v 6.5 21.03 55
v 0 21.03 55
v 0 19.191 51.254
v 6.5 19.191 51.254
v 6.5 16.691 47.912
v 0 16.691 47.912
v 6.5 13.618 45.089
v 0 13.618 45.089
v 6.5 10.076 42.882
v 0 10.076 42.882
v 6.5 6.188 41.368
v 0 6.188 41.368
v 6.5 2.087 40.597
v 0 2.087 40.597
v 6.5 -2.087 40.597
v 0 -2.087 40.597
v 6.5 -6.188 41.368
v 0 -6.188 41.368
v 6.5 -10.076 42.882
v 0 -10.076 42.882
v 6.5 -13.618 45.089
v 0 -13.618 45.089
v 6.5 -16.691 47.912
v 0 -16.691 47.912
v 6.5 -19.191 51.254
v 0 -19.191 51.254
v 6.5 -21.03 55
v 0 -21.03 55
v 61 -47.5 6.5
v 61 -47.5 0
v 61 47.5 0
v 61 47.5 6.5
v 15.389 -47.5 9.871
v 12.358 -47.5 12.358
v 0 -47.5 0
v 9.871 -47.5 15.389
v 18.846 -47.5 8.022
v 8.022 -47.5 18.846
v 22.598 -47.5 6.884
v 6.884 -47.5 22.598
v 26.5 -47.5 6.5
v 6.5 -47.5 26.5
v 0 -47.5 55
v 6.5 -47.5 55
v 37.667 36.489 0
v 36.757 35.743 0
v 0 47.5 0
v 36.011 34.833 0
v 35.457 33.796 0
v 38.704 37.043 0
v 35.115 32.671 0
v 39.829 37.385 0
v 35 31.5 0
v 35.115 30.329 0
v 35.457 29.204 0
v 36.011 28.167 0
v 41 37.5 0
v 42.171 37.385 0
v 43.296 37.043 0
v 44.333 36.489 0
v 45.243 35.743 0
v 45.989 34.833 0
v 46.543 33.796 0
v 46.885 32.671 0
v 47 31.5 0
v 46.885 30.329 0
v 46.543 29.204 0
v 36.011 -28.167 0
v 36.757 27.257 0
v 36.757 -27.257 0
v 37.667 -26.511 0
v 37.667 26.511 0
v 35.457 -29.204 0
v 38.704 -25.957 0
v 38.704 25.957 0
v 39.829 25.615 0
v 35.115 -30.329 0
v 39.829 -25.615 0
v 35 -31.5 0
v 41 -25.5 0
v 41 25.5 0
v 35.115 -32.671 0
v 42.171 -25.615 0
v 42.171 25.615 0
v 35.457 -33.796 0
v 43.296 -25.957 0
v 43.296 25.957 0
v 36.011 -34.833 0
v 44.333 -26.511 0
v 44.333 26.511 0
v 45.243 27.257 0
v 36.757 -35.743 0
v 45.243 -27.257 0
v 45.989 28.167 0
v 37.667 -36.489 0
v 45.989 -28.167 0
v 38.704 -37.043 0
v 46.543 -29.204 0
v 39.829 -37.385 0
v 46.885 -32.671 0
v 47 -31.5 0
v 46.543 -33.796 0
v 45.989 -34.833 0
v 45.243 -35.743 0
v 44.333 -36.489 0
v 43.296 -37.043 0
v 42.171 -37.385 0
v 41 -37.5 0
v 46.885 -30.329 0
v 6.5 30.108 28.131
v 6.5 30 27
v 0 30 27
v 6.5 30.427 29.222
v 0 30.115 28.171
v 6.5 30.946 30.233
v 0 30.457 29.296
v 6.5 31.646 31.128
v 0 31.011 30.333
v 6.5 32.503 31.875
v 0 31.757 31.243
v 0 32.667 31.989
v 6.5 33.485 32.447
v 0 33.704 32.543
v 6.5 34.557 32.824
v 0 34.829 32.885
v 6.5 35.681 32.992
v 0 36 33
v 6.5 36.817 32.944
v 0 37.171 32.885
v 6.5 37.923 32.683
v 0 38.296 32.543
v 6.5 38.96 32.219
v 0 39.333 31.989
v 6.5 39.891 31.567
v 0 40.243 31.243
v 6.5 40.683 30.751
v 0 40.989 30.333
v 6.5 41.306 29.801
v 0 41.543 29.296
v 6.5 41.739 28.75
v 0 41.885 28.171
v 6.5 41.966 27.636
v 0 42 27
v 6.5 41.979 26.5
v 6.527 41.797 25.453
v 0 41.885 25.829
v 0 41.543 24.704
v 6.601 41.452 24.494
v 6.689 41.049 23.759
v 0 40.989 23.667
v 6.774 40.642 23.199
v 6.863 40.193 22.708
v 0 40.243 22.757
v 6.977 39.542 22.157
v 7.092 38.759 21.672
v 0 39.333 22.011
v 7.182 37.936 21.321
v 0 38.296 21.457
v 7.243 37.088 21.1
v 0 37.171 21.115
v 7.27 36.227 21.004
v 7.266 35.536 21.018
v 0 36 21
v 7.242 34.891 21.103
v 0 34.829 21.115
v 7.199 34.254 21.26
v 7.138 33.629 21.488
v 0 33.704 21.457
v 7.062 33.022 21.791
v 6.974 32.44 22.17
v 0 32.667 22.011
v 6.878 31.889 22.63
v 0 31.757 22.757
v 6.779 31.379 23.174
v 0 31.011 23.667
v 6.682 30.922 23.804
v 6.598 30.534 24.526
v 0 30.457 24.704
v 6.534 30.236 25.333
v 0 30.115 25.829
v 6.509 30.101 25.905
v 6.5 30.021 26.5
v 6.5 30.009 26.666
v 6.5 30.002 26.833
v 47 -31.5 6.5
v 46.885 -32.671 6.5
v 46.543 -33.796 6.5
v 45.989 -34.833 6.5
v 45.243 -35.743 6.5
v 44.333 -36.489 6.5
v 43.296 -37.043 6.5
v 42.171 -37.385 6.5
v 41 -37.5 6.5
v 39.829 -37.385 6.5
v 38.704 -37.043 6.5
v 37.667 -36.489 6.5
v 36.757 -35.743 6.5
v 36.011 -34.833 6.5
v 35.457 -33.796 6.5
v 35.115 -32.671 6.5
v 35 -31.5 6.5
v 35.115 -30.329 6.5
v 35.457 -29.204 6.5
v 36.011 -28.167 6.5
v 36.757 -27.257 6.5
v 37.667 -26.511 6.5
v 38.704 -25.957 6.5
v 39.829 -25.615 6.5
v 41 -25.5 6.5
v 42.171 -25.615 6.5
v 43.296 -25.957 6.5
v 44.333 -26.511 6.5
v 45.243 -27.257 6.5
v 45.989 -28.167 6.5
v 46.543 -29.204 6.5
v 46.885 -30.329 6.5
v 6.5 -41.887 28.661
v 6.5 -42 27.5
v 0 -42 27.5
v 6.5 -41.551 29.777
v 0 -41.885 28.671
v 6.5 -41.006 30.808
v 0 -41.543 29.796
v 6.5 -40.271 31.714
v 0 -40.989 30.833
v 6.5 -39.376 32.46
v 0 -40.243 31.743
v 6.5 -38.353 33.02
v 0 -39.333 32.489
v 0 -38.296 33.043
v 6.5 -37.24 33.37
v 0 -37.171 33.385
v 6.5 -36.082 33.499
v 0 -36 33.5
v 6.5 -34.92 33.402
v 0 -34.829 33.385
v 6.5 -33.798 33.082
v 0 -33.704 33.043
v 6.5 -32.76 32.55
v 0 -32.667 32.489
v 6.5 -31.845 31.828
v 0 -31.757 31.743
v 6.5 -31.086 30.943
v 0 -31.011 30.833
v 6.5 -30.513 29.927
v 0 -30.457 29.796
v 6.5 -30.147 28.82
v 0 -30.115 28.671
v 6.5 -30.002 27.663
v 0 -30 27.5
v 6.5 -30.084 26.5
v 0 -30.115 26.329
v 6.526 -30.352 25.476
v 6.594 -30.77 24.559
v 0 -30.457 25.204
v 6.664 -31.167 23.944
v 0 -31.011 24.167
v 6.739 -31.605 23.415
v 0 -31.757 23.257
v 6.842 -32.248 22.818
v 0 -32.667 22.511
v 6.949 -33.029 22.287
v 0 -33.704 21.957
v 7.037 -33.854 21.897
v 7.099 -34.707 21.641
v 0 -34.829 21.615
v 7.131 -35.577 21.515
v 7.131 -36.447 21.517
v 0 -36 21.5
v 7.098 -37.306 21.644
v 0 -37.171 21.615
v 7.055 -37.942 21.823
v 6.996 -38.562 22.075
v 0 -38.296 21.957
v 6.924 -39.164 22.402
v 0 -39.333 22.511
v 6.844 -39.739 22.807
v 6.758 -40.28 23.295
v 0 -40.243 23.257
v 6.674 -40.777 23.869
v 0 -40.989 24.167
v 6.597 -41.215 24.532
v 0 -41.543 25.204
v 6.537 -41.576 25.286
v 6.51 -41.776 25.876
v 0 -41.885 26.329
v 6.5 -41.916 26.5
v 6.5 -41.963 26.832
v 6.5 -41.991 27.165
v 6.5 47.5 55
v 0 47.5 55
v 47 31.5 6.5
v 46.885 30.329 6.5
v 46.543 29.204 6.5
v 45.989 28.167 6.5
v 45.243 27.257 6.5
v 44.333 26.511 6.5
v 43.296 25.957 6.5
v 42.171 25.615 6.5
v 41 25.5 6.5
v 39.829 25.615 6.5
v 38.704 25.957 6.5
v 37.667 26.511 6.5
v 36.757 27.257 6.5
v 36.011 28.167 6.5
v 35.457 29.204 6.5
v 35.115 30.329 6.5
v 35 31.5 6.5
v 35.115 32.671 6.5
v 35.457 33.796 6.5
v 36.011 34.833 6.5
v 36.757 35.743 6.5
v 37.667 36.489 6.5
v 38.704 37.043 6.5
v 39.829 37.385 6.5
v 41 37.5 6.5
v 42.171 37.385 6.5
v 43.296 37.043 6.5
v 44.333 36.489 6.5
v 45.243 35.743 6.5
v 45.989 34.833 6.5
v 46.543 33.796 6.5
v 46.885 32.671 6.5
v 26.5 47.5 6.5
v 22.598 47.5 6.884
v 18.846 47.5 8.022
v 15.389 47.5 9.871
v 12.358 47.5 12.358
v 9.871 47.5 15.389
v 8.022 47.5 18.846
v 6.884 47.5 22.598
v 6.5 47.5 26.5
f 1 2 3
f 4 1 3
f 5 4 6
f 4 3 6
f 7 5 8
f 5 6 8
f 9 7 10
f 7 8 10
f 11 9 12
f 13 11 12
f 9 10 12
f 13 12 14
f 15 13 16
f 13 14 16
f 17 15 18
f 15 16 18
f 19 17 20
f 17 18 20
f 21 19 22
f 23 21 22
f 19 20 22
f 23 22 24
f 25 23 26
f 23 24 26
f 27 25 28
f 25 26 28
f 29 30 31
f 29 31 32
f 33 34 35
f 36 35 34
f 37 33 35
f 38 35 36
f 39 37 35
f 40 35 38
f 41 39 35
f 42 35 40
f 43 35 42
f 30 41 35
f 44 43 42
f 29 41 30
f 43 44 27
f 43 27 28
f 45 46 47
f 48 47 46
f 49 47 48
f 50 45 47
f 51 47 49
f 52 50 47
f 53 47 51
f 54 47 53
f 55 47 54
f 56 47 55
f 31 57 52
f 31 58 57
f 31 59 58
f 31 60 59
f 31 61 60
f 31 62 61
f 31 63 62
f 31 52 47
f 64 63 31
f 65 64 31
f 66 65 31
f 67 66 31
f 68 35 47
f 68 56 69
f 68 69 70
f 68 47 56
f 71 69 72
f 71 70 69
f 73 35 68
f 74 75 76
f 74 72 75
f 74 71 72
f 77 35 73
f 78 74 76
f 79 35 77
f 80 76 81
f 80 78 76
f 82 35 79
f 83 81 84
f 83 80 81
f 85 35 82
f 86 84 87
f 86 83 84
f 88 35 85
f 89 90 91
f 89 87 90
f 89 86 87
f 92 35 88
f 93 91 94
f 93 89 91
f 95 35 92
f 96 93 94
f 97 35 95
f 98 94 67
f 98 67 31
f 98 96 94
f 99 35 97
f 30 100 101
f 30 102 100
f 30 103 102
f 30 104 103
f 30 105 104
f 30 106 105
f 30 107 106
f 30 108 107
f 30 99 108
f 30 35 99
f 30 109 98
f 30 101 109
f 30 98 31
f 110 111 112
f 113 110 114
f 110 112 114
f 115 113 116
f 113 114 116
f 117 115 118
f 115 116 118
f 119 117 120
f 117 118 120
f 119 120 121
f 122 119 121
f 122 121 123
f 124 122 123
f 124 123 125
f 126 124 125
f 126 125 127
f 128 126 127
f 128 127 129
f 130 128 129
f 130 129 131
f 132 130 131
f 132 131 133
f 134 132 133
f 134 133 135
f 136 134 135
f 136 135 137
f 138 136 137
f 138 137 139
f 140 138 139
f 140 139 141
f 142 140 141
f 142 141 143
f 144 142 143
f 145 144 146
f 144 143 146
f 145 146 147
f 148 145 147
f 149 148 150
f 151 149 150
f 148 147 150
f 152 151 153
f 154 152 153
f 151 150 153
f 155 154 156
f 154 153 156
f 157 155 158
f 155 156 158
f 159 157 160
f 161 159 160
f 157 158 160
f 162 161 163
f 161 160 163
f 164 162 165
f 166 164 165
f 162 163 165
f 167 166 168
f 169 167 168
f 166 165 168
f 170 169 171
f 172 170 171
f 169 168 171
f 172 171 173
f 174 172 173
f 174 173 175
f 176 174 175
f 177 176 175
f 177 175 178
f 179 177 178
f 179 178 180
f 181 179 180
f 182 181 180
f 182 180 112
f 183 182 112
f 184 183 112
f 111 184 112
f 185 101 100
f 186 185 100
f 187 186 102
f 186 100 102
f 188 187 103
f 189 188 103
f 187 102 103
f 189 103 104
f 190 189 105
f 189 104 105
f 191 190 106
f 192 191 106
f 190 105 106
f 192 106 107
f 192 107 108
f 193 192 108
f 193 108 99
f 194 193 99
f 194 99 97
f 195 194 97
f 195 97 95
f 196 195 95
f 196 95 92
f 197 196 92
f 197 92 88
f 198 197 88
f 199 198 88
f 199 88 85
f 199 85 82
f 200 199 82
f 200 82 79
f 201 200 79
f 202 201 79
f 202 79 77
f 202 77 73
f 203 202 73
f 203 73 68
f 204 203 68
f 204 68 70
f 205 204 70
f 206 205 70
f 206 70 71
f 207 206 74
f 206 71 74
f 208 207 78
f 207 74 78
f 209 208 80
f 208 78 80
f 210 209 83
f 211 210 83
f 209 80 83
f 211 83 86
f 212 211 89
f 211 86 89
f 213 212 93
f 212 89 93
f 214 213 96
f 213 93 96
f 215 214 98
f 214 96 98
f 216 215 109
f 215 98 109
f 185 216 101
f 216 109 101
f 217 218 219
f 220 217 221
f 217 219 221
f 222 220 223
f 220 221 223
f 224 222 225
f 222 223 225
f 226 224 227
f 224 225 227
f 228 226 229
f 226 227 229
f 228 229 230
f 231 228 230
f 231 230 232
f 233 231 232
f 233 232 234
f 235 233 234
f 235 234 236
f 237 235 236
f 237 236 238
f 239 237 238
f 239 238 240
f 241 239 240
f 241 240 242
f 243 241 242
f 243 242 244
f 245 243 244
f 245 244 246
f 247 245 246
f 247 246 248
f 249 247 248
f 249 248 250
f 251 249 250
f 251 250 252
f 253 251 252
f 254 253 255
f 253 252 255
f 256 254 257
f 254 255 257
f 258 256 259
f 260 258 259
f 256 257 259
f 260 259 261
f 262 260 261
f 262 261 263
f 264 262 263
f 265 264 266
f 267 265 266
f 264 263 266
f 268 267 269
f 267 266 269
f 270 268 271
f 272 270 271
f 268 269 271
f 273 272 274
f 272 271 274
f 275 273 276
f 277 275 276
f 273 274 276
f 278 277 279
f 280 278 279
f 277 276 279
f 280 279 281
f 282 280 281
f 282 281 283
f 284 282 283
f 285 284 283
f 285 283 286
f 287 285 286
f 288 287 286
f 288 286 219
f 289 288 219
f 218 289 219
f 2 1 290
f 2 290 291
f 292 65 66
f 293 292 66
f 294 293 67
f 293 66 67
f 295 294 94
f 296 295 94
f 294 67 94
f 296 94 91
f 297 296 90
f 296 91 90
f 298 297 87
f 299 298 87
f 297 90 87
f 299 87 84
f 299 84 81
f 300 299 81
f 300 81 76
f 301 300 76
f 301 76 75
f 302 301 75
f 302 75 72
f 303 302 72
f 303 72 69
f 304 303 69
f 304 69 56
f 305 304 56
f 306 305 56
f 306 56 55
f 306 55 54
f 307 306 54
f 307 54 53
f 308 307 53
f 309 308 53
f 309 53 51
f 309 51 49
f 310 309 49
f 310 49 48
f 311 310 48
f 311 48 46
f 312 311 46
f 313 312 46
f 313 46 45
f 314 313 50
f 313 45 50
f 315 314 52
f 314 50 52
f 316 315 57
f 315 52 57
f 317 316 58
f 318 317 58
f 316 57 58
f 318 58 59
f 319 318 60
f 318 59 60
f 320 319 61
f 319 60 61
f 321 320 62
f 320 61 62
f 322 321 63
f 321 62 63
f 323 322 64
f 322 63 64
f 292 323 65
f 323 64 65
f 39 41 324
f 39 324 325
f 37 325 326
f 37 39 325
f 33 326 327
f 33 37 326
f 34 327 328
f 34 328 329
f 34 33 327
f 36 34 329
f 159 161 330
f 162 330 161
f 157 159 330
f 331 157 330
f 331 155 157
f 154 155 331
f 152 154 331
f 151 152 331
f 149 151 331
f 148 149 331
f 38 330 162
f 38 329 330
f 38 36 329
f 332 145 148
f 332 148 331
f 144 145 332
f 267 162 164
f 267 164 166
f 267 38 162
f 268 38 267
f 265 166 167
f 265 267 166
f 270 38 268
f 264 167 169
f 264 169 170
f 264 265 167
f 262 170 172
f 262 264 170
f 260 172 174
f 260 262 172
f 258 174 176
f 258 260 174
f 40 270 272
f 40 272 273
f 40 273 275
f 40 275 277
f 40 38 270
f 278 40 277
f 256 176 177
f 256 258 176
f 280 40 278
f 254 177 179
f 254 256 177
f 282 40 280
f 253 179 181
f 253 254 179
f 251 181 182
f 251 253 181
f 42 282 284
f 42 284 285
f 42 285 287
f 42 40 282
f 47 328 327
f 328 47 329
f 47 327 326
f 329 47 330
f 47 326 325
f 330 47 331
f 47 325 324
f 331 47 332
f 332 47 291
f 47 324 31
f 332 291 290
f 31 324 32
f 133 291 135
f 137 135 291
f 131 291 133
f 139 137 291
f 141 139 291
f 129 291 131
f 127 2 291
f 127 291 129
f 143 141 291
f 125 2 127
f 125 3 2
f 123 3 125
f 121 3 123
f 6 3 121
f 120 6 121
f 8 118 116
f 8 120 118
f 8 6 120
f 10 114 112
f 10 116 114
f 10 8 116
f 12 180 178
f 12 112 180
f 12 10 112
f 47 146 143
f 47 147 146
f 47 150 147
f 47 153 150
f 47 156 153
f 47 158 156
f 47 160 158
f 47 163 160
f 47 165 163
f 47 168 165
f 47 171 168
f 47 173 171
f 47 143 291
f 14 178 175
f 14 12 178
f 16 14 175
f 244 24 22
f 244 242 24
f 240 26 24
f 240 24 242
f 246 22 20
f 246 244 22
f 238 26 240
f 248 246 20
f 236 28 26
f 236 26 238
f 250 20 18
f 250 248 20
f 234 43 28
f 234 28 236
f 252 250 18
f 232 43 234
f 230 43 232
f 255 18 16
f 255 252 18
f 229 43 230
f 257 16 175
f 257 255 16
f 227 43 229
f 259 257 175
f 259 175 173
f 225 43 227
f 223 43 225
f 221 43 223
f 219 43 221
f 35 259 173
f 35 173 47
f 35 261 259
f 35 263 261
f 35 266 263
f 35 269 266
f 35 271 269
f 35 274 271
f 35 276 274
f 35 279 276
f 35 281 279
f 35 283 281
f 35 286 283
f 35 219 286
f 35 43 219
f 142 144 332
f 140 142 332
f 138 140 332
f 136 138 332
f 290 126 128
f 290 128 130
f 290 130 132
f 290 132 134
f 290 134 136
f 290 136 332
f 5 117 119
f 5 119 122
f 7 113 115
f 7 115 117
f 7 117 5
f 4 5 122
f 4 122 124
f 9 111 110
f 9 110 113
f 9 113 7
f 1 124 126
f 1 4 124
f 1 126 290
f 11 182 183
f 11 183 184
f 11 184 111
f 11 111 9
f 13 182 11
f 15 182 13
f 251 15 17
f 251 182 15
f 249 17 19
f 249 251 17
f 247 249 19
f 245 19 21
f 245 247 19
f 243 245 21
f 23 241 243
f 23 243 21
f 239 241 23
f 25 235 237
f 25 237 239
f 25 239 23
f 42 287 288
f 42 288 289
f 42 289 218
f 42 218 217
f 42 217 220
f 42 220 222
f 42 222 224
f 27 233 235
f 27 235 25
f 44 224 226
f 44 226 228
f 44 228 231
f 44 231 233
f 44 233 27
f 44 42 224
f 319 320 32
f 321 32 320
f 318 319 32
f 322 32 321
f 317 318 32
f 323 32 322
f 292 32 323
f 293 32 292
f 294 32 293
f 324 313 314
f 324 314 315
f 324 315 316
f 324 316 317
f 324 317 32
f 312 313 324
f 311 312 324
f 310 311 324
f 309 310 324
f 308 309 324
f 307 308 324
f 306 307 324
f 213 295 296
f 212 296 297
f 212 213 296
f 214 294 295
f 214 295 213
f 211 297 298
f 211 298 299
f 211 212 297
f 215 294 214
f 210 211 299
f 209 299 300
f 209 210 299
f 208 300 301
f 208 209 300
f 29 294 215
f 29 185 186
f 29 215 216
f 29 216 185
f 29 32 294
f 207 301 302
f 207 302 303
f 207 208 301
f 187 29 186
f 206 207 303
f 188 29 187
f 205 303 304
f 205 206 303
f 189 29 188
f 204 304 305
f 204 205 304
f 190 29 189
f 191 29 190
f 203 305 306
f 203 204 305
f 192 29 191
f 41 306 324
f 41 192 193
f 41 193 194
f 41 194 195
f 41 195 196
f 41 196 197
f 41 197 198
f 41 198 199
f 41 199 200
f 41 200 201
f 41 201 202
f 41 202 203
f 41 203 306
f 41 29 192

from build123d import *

# Parameters (mm, degrees)
F1_DEPTH = 47.5
F2_R     = 6
F3_DEPTH = 55.001
F4_R     = 6
F5_DEPTH = 61.001


with BuildPart() as f1:
    # F0 (on Front) → F1 (new body, symmetric)
    with BuildSketch(Plane.XZ):
        with BuildLine():
            Line((0, 55), (0, 0))
            Line((0, 0), (61, 0))
            Line((61, 0), (61, 6.5))
            Line((61, 6.5), (26.5, 6.5))
            ThreePointArc((26.5, 6.5), (12.357864, 12.357864), (6.5, 26.5))
            Line((6.5, 26.5), (6.5, 55))
            Line((6.5, 55), (0, 55))
        make_face()
    extrude(amount=F1_DEPTH, both=True)

    # F2 (on face) → F3 (cut, through all)
    with BuildSketch(Plane(origin=(0, 0, 0), x_dir=(1, 0, 0), z_dir=(0, 0, -1))):
        with Locations((41, 31.5)):
            Circle(F2_R)
        with Locations((41, -31.5)):
            Circle(F2_R)
    extrude(amount=-F3_DEPTH, mode=Mode.SUBTRACT)

    # F4 (on face) → F5 (cut, through all)
    with BuildSketch(Plane(origin=(0, 0, 0), x_dir=(0, -1, 0), z_dir=(-1, 0, 0))):
        with Locations((-36, 27)):
            Circle(F4_R)
        with Locations((36, 27.5)):
            Circle(F4_R)
        with BuildLine():
            Line((21.029741, 55), (-21.029741, 55))
            ThreePointArc((-21.029741, 55), (0, 40.5), (21.029741, 55))
        make_face()
    extrude(amount=-F5_DEPTH, mode=Mode.SUBTRACT)


solid = f1.part
